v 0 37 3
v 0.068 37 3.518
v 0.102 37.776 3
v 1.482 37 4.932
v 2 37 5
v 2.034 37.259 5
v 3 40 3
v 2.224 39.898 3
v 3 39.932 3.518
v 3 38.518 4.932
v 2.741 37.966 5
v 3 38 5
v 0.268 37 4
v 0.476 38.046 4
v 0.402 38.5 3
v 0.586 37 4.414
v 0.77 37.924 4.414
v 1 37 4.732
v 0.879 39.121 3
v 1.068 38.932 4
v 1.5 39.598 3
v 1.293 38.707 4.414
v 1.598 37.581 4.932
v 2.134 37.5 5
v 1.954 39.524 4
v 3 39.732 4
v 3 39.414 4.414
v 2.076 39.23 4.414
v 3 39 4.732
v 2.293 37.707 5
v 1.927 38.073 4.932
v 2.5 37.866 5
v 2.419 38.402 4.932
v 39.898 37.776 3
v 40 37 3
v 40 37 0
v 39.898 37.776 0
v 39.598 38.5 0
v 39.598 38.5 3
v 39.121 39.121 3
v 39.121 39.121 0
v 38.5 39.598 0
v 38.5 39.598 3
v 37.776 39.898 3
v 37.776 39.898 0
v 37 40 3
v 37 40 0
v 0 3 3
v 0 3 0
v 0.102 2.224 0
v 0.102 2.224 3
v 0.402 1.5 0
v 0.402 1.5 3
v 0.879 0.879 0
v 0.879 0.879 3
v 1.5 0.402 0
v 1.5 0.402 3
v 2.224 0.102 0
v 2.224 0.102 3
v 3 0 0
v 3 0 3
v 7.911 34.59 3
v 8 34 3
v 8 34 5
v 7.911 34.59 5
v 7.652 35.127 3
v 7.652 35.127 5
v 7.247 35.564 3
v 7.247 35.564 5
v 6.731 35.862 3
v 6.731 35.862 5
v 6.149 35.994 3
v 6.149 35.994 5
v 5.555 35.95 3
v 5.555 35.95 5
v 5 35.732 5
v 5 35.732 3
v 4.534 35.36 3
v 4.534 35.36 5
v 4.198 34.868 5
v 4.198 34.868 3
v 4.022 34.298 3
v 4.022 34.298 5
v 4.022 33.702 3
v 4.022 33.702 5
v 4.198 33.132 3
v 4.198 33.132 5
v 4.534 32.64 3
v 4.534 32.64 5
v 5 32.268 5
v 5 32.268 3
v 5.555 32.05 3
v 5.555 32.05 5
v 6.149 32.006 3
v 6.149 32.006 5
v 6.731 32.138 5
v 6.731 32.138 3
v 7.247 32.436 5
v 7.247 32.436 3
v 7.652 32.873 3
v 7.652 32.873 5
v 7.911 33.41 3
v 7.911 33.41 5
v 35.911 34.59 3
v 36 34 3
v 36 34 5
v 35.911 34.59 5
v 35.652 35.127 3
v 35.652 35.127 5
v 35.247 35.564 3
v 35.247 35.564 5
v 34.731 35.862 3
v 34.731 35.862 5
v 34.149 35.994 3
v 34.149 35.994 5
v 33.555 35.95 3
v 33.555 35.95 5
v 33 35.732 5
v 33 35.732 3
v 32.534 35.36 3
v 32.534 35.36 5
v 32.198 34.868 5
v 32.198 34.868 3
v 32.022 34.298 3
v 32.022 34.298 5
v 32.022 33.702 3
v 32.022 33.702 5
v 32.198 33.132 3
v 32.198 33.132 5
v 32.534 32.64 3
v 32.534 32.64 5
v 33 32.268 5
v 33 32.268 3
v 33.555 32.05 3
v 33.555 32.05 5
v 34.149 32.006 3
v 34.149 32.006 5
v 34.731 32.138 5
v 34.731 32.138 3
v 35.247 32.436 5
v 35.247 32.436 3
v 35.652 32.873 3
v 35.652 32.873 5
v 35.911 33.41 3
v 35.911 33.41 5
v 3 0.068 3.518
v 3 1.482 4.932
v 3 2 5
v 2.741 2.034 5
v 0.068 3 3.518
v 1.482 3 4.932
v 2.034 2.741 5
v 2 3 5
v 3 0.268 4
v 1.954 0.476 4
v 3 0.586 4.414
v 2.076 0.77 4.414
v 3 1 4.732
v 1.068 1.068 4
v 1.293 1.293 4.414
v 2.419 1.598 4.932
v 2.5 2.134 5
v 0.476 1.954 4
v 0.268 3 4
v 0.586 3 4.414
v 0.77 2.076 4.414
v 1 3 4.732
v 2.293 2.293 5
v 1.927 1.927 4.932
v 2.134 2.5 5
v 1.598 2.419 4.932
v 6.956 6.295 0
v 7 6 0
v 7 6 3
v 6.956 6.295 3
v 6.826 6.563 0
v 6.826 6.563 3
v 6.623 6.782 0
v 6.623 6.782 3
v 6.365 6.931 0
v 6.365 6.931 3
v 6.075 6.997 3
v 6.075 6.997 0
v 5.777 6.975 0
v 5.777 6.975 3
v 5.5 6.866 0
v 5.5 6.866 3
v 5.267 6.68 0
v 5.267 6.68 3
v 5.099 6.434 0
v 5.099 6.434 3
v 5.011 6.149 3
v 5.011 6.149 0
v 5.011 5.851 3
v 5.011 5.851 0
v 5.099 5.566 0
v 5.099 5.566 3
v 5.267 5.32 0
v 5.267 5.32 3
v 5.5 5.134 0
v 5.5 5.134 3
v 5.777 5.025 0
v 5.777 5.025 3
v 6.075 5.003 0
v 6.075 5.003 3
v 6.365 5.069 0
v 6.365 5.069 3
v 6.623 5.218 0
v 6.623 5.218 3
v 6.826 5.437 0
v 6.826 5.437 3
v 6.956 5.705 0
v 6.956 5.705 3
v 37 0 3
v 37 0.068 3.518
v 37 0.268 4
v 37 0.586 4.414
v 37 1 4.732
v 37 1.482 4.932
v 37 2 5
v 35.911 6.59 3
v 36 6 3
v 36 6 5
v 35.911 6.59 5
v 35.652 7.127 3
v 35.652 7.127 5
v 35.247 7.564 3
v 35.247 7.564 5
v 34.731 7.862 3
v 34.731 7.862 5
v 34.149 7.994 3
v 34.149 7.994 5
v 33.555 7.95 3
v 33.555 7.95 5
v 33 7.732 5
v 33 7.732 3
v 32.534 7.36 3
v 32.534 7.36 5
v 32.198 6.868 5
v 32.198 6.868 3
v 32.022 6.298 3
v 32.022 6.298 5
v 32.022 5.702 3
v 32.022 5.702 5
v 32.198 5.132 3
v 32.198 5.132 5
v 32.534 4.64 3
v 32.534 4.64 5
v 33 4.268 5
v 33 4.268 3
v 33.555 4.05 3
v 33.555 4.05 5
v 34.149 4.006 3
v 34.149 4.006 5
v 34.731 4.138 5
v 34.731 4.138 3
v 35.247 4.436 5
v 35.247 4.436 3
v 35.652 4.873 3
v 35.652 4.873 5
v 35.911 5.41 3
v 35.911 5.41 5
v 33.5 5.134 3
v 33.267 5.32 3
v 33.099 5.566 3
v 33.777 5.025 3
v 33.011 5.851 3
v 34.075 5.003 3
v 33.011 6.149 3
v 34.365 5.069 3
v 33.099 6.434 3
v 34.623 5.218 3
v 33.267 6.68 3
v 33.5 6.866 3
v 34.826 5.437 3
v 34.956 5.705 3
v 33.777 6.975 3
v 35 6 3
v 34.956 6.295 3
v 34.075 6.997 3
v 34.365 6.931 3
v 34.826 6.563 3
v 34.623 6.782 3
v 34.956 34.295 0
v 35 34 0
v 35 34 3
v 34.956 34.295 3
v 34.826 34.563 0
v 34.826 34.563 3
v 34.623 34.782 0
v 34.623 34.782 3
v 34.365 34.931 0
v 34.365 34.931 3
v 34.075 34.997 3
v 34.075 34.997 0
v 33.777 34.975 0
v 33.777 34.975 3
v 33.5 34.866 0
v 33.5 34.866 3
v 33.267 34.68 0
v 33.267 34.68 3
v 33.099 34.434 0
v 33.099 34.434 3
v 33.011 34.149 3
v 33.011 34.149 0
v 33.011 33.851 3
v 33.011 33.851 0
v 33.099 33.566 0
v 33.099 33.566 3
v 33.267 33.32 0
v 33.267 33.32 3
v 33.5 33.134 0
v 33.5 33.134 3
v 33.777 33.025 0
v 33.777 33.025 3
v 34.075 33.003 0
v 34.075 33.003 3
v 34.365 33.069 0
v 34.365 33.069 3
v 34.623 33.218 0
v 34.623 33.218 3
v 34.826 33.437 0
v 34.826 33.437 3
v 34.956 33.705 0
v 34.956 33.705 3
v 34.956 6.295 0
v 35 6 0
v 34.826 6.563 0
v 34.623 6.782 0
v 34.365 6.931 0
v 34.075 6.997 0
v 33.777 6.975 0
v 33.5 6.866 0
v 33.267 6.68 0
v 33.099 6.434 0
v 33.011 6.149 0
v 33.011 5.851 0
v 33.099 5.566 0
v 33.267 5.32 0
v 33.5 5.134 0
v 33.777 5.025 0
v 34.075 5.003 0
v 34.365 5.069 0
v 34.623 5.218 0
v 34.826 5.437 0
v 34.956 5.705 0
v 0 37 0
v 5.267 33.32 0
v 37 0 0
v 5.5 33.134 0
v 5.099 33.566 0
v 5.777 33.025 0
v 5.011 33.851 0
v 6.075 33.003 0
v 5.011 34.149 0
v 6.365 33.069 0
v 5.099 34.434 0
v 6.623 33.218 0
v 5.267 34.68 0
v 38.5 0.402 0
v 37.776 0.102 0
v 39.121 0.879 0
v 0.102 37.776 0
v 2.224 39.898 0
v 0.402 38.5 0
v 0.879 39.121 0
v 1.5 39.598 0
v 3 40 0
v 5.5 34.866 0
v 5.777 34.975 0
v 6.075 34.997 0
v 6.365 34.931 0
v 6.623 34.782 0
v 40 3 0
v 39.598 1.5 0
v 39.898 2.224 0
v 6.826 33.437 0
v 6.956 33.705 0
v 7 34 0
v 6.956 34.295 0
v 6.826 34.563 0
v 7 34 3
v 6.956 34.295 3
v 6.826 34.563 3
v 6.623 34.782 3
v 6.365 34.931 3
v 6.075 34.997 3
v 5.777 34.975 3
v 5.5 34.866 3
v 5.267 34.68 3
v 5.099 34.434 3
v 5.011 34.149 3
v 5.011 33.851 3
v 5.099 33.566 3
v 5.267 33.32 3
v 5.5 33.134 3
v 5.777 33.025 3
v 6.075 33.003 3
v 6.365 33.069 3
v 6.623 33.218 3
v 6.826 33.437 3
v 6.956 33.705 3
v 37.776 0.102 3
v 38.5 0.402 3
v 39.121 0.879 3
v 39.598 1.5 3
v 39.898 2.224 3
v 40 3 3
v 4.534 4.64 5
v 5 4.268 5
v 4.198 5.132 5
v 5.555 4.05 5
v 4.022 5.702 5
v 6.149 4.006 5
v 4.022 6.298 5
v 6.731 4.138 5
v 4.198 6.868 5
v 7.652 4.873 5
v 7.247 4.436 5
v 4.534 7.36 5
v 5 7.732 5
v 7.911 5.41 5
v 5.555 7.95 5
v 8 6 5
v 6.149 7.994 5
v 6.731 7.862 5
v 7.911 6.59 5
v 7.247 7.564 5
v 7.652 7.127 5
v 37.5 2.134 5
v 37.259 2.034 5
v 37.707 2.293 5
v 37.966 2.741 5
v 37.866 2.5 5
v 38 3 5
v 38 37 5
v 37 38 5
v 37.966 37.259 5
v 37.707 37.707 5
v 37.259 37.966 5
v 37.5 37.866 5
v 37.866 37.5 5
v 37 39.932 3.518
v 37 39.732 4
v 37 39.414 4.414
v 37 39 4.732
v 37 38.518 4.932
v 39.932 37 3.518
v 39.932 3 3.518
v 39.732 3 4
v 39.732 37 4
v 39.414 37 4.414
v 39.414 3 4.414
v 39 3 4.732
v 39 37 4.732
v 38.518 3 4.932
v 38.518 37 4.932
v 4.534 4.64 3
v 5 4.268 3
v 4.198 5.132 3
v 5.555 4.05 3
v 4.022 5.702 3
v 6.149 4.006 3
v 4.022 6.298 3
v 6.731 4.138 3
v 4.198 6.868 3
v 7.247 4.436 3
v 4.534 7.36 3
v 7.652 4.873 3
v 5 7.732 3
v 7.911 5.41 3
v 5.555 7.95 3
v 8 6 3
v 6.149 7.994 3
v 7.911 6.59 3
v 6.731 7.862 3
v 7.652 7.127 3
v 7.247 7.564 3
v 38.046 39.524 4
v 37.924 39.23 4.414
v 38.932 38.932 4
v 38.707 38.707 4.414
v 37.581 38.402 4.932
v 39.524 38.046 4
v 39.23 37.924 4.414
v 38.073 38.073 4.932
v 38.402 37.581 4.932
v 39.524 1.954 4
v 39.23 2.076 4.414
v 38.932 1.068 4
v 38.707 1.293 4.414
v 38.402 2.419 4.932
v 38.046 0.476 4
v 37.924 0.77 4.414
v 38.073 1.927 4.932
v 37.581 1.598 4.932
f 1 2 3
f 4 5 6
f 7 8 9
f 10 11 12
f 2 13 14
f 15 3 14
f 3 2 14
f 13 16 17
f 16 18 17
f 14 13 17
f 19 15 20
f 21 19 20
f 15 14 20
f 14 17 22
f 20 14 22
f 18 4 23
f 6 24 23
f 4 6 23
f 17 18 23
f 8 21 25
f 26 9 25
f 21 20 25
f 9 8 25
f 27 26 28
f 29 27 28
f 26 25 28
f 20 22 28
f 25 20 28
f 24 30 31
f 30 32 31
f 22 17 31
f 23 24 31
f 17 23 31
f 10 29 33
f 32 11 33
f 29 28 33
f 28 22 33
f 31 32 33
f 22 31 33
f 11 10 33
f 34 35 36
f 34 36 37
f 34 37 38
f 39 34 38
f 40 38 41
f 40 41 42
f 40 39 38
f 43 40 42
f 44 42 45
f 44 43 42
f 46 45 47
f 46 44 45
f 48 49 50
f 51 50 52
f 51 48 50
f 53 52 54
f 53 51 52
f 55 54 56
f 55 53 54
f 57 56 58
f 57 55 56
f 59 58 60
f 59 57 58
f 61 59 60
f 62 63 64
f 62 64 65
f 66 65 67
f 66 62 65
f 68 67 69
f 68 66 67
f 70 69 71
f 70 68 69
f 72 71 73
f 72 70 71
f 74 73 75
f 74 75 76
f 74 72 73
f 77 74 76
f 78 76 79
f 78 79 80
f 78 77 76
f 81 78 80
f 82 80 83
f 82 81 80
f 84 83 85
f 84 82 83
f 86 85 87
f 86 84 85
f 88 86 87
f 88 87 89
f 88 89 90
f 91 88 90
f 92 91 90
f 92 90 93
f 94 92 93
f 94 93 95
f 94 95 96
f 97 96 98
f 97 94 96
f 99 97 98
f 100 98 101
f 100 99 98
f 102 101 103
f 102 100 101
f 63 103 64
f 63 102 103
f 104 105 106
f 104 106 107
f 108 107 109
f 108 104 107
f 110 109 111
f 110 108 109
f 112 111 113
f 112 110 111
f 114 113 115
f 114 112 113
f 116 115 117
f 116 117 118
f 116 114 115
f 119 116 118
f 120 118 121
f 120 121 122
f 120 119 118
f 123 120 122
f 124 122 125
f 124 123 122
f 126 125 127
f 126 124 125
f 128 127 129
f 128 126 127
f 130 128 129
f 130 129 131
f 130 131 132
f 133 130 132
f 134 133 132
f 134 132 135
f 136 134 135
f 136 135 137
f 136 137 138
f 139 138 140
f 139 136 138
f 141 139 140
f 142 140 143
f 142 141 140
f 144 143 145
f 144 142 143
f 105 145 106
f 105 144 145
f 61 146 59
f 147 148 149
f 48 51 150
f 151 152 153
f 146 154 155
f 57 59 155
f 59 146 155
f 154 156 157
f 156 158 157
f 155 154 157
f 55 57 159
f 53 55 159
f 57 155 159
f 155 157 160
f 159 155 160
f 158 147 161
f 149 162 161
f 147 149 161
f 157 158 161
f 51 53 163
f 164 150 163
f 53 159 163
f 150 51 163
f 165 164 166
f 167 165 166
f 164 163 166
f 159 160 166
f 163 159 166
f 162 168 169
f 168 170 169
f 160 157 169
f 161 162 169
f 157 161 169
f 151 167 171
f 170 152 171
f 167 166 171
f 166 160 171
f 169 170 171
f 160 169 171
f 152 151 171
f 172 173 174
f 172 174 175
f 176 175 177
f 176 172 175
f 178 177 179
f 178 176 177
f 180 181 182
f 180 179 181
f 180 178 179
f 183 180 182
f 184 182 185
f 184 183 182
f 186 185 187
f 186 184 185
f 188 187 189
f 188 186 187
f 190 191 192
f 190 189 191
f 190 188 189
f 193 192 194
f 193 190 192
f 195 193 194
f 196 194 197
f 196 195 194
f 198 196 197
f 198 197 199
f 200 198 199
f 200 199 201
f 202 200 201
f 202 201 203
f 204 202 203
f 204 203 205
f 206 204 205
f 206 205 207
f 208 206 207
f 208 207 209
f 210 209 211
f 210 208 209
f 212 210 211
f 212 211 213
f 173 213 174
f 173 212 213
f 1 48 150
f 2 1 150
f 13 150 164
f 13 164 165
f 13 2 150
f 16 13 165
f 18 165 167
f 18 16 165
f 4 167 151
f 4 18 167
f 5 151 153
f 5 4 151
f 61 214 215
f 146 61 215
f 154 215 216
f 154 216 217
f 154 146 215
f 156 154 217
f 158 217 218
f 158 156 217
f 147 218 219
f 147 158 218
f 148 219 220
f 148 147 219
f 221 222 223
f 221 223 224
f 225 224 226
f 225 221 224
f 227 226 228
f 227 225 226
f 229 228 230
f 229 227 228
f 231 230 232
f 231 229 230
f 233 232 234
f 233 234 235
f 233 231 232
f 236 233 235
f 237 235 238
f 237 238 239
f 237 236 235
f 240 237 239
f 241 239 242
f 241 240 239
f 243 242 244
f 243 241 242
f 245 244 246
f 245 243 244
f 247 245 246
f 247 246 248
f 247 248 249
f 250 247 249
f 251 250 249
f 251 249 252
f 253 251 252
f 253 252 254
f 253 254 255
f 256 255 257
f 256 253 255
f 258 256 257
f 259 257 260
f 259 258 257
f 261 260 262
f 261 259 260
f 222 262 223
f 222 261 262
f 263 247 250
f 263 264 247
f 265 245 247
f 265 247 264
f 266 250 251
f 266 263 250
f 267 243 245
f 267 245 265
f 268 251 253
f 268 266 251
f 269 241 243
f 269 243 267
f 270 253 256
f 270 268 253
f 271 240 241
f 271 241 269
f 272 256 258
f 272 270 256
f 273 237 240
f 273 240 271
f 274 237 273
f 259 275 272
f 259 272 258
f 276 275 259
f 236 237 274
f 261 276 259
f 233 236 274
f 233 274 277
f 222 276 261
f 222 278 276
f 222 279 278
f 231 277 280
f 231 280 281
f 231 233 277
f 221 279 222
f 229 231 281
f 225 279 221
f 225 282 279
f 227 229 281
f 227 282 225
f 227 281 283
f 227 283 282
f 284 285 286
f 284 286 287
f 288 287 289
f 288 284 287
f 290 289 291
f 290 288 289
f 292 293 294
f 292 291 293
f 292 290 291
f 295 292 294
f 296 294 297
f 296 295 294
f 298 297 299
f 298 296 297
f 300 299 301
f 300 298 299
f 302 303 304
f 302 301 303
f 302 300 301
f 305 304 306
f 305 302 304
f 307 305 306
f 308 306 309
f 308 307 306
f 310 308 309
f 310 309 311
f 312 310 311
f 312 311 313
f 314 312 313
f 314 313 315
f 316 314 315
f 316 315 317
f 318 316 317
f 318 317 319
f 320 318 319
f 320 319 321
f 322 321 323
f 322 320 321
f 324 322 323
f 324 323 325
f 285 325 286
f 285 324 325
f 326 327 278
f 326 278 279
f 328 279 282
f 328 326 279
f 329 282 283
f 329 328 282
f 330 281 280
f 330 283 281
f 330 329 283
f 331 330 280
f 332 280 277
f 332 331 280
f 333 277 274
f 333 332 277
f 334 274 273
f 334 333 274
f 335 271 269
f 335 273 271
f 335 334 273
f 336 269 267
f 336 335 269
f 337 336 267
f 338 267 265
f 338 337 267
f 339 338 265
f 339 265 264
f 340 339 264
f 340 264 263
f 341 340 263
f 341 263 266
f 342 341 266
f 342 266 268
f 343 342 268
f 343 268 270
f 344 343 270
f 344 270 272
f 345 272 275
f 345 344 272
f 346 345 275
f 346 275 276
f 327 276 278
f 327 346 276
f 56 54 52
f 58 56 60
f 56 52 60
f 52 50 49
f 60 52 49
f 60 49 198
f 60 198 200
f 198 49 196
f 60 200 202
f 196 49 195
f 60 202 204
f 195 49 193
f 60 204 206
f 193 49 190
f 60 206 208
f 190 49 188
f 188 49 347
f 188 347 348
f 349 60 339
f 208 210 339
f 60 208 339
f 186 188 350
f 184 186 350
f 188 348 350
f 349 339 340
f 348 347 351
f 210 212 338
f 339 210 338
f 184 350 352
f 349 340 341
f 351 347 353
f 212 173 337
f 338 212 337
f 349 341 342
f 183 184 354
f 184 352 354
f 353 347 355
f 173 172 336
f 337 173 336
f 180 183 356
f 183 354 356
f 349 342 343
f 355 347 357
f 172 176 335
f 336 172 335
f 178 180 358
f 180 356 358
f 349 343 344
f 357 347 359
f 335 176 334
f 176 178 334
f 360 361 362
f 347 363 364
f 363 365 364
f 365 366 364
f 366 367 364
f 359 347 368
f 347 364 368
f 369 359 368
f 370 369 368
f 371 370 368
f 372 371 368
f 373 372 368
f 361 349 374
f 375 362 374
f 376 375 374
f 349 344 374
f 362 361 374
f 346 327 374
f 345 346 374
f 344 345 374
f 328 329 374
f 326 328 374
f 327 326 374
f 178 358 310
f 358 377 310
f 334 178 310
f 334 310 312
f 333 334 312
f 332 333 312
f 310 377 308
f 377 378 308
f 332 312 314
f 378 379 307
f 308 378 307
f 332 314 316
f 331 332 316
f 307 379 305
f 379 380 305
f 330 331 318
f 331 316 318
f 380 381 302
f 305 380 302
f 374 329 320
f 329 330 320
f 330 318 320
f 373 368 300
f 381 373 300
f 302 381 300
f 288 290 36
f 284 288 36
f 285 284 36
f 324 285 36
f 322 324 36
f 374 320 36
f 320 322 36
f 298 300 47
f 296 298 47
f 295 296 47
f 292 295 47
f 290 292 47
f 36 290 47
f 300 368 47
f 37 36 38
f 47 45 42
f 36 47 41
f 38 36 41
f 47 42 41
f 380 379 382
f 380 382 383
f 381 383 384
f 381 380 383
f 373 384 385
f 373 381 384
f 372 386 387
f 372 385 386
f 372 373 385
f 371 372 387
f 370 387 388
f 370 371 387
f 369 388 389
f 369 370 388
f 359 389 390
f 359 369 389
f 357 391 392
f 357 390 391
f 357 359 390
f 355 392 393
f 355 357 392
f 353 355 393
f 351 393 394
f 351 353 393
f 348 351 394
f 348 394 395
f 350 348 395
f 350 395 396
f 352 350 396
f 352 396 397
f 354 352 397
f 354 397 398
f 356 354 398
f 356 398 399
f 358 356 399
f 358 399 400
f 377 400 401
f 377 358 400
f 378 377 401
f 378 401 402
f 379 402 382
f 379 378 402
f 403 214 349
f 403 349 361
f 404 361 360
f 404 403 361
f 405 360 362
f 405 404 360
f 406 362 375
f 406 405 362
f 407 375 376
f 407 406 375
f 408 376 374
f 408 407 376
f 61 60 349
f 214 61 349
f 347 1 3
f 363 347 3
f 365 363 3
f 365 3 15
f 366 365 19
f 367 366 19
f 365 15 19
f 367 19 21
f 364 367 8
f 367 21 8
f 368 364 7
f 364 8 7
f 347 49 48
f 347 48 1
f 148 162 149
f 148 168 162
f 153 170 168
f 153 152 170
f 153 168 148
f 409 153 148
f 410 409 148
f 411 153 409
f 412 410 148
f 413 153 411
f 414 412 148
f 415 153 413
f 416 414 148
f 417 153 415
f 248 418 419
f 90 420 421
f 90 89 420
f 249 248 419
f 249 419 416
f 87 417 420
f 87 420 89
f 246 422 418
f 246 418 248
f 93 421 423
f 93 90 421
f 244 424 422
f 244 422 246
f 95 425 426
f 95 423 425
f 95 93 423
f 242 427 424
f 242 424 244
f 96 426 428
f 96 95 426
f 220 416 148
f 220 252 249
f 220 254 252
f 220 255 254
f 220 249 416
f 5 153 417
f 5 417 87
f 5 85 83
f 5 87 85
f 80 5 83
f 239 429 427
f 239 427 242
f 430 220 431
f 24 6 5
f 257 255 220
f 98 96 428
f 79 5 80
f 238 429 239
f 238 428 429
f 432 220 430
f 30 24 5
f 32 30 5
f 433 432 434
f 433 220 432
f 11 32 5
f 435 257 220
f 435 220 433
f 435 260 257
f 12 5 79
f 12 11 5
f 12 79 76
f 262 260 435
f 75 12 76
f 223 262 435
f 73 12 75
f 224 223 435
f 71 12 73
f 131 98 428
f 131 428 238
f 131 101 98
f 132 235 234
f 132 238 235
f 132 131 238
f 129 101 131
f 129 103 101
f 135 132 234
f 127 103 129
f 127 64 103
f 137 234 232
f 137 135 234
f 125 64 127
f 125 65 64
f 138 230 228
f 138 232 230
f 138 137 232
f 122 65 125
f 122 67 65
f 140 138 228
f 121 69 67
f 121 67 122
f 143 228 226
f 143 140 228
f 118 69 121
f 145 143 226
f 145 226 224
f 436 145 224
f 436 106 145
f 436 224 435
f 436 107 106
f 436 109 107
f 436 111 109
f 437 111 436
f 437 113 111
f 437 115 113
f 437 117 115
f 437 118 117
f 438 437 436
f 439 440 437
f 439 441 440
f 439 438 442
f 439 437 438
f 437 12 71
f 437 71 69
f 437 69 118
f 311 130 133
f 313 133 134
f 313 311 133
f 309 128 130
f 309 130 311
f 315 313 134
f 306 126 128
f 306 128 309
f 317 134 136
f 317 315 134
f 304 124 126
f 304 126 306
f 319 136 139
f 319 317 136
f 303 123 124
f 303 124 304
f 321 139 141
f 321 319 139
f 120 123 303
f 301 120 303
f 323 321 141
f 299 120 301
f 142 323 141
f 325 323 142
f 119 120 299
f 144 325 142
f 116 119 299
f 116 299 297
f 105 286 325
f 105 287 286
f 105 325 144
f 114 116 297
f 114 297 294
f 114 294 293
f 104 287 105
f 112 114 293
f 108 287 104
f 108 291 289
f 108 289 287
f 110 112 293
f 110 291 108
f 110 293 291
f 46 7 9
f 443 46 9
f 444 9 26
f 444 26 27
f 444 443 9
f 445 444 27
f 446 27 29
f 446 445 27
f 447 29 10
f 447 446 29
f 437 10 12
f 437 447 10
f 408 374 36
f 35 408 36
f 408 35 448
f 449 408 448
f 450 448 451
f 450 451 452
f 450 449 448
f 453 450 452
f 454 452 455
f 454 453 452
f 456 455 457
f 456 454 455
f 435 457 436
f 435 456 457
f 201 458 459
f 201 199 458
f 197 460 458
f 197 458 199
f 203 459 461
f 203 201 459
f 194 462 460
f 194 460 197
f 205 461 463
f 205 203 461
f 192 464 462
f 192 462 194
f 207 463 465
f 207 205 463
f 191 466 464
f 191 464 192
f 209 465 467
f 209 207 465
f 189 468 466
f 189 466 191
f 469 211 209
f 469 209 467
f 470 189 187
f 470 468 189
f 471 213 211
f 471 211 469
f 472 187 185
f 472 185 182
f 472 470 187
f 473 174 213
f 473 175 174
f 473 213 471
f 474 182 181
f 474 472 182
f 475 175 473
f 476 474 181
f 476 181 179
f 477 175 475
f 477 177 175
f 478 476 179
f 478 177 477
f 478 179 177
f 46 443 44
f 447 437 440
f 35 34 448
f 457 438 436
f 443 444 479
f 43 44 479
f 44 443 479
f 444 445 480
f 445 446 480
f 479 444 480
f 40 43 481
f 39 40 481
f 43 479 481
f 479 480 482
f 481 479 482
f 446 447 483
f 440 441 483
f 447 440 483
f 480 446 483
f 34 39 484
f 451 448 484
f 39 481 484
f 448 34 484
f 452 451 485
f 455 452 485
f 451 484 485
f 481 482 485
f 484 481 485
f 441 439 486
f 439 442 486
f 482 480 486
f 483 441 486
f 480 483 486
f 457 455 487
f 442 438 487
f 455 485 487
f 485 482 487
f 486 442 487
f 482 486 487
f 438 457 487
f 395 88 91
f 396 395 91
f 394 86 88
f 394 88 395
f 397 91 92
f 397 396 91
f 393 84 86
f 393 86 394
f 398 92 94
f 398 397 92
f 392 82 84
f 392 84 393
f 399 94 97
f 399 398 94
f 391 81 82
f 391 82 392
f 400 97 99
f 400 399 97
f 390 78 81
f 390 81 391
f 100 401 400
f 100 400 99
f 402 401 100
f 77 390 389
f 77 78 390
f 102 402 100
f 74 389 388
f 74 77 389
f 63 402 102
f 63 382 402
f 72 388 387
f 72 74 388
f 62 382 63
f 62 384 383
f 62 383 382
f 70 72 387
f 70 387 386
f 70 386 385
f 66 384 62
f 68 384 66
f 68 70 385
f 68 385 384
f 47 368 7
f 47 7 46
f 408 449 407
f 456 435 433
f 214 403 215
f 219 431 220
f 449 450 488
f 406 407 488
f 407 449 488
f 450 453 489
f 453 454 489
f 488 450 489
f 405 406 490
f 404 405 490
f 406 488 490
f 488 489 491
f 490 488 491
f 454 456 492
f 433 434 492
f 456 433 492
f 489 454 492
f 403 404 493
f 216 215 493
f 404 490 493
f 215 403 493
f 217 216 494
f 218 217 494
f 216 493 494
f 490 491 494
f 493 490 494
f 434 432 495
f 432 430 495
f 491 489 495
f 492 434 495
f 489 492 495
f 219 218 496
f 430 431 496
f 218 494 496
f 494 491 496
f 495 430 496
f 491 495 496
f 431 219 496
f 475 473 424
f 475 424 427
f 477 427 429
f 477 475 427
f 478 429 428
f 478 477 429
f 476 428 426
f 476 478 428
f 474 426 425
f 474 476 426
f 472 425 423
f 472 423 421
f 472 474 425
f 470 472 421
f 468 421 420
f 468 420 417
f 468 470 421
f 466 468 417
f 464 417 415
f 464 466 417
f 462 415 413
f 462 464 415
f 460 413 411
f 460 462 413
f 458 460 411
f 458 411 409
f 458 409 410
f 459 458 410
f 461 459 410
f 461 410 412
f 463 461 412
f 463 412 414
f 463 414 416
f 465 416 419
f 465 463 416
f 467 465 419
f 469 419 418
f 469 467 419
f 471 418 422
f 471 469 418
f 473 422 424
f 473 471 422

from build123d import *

# Parameters (mm, degrees)
CYLINDER002_R     = 2
CYLINDER002_DEPTH = 2
ARRAY001_X_COUNT  = 2
ARRAY001_X_PITCH  = 28
ARRAY001_Y_COUNT  = 2
ARRAY001_Y_PITCH  = 28
CYLINDER001_R     = 1
CYLINDER001_DEPTH = 10
ARRAY_X_COUNT     = 2
ARRAY_X_PITCH     = 28
ARRAY_Y_COUNT     = 2
ARRAY_Y_PITCH     = 28
BOX_W             = 40
BOX_H             = 40
BOX_DEPTH         = 5
FILLET_R          = 3
FILLET001_R       = 2


with BuildPart() as array001:
    # Cylinder002 → Cylinder002 (new body)
    with BuildSketch(Plane(origin=(6, 6, 3), x_dir=(1, 0, 0), z_dir=(0, 0, 1))):
        Circle(CYLINDER002_R)
    extrude(amount=CYLINDER002_DEPTH)

    # Array001 X: Array001 ×2


with BuildPart() as array001_1:
    add(array001.part)
    with Locations(*[(i * ARRAY001_X_PITCH, 0, 0) for i in range(1, ARRAY001_X_COUNT)]):
        add(array001.part)

    # Array001 Y: Array001 ×2


with BuildPart() as array001_2:
    add(array001_1.part)
    with Locations(*[(0, i * ARRAY001_Y_PITCH, 0) for i in range(1, ARRAY001_Y_COUNT)]):
        add(array001_1.part)


with BuildPart() as array:
    # Cylinder001 → Cylinder001 (new body)
    with BuildSketch(Plane(origin=(6, 6, -2), x_dir=(1, 0, 0), z_dir=(0, 0, 1))):
        Circle(CYLINDER001_R)
    extrude(amount=CYLINDER001_DEPTH)

    # Array X: Array ×2


with BuildPart() as array_1:
    add(array.part)
    with Locations(*[(i * ARRAY_X_PITCH, 0, 0) for i in range(1, ARRAY_X_COUNT)]):
        add(array.part)

    # Array Y: Array ×2


with BuildPart() as array_2:
    add(array_1.part)
    with Locations(*[(0, i * ARRAY_Y_PITCH, 0) for i in range(1, ARRAY_Y_COUNT)]):
        add(array_1.part)


with BuildPart() as cut002:
    # Box → Box (new body)
    with BuildSketch(Plane.XY):
        with Locations((20, 20)):
            Rectangle(BOX_W, BOX_H)
    extrude(amount=BOX_DEPTH)

    # Fillet
    fillet_edges = [cut002.edges().sort_by_distance(p)[0] for p in [
        (0, 0, 2.5),
        (0, 40, 2.5),
        (40, 0, 2.5),
        (40, 40, 2.5),
    ]]
    fillet(fillet_edges, radius=FILLET_R)

    # Fillet001
    fillet001_edges = [cut002.edges().sort_by_distance(p)[0] for p in [
        (0, 20, 5),
        (0.87868, 0.87868, 5),
        (0.87868, 39.12132, 5),
        (20, 0, 5),
        (20, 40, 5),
        (39.12132, 0.87868, 5),
        (39.12132, 39.12132, 5),
        (40, 20, 5),
    ]]
    fillet(fillet001_edges, radius=FILLET001_R)

    # Cut001: cut Array
    add(array_2.part, mode=Mode.SUBTRACT)

    # Cut002: cut Array001
    add(array001_2.part, mode=Mode.SUBTRACT)


solid = cut002.part
